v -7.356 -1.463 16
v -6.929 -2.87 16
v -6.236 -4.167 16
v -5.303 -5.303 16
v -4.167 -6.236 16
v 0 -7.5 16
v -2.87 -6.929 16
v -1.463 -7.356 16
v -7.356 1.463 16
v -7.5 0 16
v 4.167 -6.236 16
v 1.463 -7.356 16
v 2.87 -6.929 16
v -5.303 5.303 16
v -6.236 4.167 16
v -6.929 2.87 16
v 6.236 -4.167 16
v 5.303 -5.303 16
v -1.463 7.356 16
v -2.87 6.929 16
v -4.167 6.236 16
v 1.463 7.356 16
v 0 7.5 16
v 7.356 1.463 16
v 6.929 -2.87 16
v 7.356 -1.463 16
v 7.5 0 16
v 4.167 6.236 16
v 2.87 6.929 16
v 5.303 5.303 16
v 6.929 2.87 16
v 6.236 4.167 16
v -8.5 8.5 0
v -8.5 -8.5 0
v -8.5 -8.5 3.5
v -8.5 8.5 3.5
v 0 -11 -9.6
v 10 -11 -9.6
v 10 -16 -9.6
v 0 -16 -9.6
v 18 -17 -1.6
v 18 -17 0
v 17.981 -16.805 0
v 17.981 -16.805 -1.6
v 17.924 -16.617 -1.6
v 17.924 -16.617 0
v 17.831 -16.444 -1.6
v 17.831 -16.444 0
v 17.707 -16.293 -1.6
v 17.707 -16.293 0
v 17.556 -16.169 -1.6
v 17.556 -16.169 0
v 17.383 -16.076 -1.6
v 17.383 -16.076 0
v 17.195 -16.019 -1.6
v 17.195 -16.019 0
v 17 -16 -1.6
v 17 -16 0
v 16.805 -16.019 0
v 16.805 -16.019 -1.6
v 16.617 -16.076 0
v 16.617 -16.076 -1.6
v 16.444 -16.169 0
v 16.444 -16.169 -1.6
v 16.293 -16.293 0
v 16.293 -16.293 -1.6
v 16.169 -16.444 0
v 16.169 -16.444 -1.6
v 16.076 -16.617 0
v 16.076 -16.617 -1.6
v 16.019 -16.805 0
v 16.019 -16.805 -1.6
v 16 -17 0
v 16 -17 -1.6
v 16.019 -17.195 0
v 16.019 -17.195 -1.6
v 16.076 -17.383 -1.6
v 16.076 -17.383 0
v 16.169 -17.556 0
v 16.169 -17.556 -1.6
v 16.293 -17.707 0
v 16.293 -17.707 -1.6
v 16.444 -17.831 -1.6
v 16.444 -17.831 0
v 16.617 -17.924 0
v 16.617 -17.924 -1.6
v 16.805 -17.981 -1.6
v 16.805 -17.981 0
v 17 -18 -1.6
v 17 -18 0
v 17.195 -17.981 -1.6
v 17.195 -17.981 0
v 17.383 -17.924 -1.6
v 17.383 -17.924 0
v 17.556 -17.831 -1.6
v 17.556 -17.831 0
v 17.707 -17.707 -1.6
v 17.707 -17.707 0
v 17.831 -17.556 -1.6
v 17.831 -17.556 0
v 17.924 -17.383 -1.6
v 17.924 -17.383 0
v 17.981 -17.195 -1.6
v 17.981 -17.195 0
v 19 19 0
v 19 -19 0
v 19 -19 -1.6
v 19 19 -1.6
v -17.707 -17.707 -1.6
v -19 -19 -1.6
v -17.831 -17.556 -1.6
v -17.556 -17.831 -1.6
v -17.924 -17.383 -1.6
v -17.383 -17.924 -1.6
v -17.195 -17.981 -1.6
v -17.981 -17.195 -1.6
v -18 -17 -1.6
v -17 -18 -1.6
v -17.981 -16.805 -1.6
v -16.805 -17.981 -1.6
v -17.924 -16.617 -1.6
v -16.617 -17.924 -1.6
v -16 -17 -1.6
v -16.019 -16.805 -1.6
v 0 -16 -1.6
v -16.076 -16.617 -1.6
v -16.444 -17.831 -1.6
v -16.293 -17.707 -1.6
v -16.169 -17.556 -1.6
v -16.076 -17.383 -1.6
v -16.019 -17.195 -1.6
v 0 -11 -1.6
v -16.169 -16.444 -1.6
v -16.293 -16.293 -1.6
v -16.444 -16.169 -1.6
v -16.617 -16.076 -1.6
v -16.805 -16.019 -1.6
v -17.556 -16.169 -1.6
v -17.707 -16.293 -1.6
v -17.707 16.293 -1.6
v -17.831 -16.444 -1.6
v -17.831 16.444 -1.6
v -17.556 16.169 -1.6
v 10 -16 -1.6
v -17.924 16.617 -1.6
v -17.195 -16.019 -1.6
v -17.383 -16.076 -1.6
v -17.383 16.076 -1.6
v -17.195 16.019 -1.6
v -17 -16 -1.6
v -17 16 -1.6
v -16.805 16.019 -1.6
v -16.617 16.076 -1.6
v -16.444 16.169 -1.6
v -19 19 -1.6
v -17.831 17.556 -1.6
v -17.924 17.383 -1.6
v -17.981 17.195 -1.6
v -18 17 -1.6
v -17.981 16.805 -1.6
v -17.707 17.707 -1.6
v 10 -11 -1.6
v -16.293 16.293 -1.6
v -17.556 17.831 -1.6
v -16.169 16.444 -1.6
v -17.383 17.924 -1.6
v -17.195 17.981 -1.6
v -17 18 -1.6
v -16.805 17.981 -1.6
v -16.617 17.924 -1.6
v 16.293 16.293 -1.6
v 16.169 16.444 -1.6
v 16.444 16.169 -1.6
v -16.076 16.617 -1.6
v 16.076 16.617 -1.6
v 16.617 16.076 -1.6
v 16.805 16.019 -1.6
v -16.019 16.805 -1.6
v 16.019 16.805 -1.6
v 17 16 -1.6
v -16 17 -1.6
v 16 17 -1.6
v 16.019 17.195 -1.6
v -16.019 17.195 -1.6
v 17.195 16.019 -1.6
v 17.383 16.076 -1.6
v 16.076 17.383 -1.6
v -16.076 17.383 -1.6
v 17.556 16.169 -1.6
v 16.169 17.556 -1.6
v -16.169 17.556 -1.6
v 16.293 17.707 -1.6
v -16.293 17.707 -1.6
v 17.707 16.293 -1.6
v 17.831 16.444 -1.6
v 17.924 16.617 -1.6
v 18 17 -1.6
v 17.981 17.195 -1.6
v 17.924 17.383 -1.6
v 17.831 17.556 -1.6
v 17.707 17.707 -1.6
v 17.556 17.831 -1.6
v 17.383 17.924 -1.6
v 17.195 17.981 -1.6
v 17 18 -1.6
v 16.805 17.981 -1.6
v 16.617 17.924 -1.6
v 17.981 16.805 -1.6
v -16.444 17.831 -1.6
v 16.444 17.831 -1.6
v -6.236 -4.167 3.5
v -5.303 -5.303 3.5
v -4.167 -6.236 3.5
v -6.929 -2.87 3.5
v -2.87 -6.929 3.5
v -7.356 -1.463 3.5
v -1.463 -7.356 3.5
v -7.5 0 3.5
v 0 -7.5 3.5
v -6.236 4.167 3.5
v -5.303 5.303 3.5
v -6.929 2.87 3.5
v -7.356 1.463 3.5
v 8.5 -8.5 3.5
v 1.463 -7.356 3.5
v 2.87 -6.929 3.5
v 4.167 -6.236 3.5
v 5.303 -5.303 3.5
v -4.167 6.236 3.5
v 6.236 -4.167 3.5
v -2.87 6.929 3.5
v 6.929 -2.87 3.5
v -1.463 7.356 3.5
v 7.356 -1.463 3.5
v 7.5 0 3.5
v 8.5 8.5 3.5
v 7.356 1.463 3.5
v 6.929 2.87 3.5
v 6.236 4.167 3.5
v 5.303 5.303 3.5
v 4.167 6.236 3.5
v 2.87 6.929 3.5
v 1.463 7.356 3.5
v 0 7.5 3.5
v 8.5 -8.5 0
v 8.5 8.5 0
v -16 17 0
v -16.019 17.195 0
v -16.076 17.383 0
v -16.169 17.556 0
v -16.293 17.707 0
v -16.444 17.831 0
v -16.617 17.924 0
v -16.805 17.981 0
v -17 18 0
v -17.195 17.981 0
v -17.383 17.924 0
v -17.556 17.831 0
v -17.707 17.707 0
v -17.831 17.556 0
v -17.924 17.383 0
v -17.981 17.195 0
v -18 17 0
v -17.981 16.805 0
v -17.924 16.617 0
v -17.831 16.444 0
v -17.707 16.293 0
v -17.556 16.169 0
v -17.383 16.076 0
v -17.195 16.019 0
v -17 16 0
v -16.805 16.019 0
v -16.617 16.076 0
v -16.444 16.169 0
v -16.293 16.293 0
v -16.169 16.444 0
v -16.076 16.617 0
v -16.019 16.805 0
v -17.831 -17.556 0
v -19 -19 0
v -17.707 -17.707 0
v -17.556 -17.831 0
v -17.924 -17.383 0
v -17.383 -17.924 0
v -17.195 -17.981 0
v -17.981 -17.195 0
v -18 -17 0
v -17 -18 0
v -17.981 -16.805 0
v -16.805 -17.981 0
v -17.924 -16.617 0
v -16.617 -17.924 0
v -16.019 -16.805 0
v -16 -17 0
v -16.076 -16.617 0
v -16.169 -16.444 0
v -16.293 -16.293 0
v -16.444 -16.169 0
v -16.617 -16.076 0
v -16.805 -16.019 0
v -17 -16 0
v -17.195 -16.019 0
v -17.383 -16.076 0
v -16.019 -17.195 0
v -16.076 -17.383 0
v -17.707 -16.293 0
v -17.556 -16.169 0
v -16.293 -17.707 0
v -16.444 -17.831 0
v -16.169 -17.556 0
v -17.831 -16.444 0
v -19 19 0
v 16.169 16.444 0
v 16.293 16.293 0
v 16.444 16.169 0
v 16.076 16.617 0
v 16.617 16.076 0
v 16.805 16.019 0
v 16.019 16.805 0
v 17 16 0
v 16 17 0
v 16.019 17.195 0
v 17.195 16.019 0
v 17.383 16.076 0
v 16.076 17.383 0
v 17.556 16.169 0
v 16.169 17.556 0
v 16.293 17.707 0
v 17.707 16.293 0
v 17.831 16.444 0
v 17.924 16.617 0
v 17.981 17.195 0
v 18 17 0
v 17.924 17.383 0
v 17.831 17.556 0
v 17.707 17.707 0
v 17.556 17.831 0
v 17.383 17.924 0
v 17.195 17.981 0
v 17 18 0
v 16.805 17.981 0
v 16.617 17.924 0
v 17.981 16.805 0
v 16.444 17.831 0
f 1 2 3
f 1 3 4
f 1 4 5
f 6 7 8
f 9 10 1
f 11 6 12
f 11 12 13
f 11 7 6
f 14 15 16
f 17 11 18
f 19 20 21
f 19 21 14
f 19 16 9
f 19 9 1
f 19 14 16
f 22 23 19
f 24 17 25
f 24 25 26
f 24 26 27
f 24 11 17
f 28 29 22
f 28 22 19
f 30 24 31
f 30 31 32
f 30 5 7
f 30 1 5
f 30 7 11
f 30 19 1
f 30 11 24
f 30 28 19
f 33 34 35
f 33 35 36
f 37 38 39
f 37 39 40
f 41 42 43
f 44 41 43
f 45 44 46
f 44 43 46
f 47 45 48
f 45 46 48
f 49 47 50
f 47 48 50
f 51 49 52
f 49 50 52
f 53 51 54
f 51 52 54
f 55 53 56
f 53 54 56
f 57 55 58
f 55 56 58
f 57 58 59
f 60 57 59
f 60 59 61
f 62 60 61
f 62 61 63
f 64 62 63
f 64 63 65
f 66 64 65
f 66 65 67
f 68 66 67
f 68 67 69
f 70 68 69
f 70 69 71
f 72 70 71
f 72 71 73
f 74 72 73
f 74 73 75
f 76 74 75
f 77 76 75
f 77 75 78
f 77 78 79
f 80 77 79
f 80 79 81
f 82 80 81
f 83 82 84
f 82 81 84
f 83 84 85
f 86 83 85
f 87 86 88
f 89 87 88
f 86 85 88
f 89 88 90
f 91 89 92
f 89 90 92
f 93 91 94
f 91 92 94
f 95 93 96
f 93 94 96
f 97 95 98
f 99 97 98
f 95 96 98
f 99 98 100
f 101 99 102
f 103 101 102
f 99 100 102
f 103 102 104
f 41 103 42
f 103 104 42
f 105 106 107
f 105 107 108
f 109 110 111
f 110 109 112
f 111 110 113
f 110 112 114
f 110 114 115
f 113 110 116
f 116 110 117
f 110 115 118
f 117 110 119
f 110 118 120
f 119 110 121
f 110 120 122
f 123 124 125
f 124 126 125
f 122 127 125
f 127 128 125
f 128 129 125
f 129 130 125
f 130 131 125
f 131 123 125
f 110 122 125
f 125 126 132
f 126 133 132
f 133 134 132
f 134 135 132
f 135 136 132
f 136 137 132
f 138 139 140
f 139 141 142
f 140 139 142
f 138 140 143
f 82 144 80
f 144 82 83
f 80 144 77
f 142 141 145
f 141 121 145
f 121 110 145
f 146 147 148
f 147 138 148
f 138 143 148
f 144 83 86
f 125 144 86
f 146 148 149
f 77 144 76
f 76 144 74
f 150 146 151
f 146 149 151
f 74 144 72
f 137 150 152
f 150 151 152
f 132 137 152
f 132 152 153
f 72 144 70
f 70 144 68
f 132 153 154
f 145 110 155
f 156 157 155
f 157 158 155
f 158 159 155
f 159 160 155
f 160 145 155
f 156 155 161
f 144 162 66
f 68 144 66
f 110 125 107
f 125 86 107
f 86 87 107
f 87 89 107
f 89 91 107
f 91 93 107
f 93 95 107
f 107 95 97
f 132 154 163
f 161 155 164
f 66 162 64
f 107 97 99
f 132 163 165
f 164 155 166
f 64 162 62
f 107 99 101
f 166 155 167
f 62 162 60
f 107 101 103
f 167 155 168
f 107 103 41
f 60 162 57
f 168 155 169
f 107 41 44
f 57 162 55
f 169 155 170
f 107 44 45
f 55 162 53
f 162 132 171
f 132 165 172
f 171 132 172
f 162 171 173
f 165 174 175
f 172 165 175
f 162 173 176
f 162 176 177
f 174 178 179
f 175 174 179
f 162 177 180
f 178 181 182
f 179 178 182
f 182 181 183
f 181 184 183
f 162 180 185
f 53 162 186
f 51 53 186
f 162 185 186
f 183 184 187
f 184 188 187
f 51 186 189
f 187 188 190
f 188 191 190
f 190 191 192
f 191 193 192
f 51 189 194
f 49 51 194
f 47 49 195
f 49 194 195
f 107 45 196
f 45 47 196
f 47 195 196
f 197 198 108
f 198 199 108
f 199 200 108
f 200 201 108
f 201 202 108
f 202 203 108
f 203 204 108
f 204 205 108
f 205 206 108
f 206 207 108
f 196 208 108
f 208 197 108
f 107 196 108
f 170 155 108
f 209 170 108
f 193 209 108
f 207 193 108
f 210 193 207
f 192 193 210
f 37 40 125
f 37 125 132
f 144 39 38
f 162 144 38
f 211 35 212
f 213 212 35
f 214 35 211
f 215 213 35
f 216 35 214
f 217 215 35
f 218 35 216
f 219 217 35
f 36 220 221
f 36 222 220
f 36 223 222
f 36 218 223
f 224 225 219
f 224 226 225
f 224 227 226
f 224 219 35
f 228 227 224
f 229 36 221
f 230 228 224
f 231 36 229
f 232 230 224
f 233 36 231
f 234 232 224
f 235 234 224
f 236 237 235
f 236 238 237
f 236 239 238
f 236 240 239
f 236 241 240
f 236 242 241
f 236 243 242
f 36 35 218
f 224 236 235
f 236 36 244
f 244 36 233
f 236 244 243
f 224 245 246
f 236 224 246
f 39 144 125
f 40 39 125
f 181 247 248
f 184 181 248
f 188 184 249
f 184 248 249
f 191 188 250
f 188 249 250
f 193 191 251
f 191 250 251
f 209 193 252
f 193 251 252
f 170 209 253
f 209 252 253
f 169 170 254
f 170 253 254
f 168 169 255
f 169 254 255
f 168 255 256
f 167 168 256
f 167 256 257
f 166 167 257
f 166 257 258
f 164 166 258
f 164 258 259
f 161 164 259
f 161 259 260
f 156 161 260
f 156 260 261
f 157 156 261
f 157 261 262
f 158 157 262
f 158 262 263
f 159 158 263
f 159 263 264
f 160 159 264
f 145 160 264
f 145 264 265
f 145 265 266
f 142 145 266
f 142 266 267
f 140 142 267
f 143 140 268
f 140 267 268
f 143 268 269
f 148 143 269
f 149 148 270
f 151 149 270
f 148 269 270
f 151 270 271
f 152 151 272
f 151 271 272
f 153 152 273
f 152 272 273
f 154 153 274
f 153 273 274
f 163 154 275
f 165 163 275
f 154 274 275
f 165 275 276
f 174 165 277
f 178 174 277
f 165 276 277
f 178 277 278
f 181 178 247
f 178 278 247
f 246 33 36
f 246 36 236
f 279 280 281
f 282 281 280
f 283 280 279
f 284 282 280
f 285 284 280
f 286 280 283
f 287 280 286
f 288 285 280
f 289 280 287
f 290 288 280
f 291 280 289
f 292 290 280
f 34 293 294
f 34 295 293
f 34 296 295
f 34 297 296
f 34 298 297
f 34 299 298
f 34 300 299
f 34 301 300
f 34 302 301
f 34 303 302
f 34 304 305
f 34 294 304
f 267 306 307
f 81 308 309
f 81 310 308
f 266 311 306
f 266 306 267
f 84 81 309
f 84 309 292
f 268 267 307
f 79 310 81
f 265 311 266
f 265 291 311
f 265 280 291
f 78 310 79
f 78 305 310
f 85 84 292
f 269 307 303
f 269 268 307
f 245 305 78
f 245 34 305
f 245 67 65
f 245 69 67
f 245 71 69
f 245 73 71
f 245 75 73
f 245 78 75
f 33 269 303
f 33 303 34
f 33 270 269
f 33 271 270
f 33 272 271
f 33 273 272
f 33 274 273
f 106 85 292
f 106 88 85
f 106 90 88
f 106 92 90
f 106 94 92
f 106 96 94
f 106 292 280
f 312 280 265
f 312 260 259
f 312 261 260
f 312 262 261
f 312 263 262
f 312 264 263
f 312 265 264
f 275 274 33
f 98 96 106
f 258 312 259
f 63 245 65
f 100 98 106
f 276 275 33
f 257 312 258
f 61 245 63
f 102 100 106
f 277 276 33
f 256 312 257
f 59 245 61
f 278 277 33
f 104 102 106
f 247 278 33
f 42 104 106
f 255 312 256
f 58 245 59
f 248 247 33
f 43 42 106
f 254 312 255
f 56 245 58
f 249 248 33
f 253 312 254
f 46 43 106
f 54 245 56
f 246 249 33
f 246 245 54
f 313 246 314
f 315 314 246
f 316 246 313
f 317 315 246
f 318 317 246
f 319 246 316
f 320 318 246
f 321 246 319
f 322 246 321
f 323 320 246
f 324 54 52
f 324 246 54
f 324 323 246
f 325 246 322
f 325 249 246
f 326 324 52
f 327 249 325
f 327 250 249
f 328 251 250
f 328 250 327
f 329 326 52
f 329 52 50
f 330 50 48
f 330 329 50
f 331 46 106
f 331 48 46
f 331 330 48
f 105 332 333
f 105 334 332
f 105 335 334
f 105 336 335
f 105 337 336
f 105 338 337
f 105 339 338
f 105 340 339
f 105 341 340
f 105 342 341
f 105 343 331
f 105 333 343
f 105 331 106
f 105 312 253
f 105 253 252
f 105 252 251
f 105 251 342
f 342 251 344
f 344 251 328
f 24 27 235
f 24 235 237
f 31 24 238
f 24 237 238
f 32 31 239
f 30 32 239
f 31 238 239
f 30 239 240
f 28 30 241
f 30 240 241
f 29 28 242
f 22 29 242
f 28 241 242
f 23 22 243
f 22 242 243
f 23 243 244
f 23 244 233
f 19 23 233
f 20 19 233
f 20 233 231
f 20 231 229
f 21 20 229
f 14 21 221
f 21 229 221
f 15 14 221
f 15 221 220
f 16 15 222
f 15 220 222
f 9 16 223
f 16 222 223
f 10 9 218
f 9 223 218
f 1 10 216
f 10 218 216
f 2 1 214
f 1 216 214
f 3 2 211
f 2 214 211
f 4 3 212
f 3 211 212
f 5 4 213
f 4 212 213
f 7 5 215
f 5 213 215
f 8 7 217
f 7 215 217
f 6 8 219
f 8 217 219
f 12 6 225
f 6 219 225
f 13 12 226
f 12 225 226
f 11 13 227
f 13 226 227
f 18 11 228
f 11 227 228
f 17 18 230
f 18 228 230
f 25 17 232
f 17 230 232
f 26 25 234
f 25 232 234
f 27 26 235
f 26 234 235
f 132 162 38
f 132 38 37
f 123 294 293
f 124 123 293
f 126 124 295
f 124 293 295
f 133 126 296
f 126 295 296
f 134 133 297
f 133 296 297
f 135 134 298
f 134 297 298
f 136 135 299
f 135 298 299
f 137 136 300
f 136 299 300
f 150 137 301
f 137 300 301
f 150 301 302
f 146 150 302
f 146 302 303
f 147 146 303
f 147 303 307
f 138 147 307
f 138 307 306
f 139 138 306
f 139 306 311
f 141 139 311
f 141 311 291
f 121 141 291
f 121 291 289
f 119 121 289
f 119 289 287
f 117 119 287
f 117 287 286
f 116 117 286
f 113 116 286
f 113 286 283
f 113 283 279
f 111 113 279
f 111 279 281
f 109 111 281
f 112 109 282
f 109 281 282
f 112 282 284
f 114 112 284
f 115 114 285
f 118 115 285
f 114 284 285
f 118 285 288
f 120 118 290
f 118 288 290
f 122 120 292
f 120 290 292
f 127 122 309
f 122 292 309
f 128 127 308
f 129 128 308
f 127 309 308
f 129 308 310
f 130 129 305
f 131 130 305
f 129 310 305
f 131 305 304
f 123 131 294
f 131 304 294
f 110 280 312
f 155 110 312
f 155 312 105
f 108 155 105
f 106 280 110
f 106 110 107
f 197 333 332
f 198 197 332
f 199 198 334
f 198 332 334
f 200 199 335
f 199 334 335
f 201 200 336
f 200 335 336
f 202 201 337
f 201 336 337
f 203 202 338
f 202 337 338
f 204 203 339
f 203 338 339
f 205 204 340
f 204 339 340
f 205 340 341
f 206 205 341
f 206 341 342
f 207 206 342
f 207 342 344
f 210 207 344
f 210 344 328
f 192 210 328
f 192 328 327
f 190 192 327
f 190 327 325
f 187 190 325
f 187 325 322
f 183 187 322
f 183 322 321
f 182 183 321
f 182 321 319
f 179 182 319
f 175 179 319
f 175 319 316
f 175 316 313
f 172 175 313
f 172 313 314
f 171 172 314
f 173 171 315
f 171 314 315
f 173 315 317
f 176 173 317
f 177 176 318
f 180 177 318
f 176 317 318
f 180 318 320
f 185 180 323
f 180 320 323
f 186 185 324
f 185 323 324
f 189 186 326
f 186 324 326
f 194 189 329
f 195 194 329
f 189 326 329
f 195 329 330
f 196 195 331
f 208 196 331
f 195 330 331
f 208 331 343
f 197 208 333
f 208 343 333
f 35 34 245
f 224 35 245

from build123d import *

# Parameters (mm, degrees)
SKETCH1_W           = 38
SKETCH1_H           = 38
BOSS_EXTRUDE1_DEPTH = 1.6
SKETCH2_W           = 17
SKETCH2_H           = 17
BOSS_EXTRUDE2_DEPTH = 3.5
SKETCH3_R           = 7.5
BOSS_EXTRUDE3_DEPTH = 12.5
CUT_EXTRUDE1_REACH  = 3.6
SKETCH4_R           = 1
SKETCH5_W           = 10
SKETCH5_H           = 5
BOSS_EXTRUDE4_DEPTH = 8


with BuildPart() as part:
    # Sketch1 → Boss-Extrude1 (new body)
    with BuildSketch(Plane.XY):
        Rectangle(SKETCH1_W, SKETCH1_H)
    extrude(amount=-BOSS_EXTRUDE1_DEPTH)

    # Sketch2 → Boss-Extrude2 (add)
    with BuildSketch(Plane.XY):
        Rectangle(SKETCH2_W, SKETCH2_H)
    extrude(amount=BOSS_EXTRUDE2_DEPTH)

    # Sketch3 → Boss-Extrude3 (add)
    with BuildSketch(Plane.XY.offset(3.5)):
        Circle(SKETCH3_R)
    extrude(amount=BOSS_EXTRUDE3_DEPTH)

    # Sketch4 → Cut-Extrude1 (cut, up to next)
    with BuildSketch(Plane.XY, mode=Mode.PRIVATE) as cut_extrude1_sk1:
        with Locations((-17, 17)):
            Circle(SKETCH4_R)
    cut_extrude1_tool1 = extrude(cut_extrude1_sk1.sketch, amount=-CUT_EXTRUDE1_REACH, mode=Mode.PRIVATE) & part.part
    add(cut_extrude1_tool1.solids().sort_by_distance((-17, 17, 0))[0], mode=Mode.SUBTRACT)
    # Sketch4 → Cut-Extrude1 (cut, up to next)
    with BuildSketch(Plane.XY, mode=Mode.PRIVATE) as cut_extrude1_sk2:
        with Locations((17, 17)):
            Circle(SKETCH4_R)
    cut_extrude1_tool2 = extrude(cut_extrude1_sk2.sketch, amount=-CUT_EXTRUDE1_REACH, mode=Mode.PRIVATE) & part.part
    add(cut_extrude1_tool2.solids().sort_by_distance((17, 17, 0))[0], mode=Mode.SUBTRACT)
    # Sketch4 → Cut-Extrude1 (cut, up to next)
    with BuildSketch(Plane.XY, mode=Mode.PRIVATE) as cut_extrude1_sk3:
        with Locations((-17, -17)):
            Circle(SKETCH4_R)
    cut_extrude1_tool3 = extrude(cut_extrude1_sk3.sketch, amount=-CUT_EXTRUDE1_REACH, mode=Mode.PRIVATE) & part.part
    add(cut_extrude1_tool3.solids().sort_by_distance((-17, -17, 0))[0], mode=Mode.SUBTRACT)
    # Sketch4 → Cut-Extrude1 (cut, up to next)
    with BuildSketch(Plane.XY, mode=Mode.PRIVATE) as cut_extrude1_sk4:
        with Locations((17, -17)):
            Circle(SKETCH4_R)
    cut_extrude1_tool4 = extrude(cut_extrude1_sk4.sketch, amount=-CUT_EXTRUDE1_REACH, mode=Mode.PRIVATE) & part.part
    add(cut_extrude1_tool4.solids().sort_by_distance((17, -17, 0))[0], mode=Mode.SUBTRACT)

    # Sketch5 → Boss-Extrude4 (add)
    with BuildSketch(Plane(origin=(0, 0, -1.6), x_dir=(-1, 0, 0), z_dir=(0, 0, -1))):
        with Locations((-5, -13.5)):
            Rectangle(SKETCH5_W, SKETCH5_H)
    extrude(amount=BOSS_EXTRUDE4_DEPTH)


solid = part.part
